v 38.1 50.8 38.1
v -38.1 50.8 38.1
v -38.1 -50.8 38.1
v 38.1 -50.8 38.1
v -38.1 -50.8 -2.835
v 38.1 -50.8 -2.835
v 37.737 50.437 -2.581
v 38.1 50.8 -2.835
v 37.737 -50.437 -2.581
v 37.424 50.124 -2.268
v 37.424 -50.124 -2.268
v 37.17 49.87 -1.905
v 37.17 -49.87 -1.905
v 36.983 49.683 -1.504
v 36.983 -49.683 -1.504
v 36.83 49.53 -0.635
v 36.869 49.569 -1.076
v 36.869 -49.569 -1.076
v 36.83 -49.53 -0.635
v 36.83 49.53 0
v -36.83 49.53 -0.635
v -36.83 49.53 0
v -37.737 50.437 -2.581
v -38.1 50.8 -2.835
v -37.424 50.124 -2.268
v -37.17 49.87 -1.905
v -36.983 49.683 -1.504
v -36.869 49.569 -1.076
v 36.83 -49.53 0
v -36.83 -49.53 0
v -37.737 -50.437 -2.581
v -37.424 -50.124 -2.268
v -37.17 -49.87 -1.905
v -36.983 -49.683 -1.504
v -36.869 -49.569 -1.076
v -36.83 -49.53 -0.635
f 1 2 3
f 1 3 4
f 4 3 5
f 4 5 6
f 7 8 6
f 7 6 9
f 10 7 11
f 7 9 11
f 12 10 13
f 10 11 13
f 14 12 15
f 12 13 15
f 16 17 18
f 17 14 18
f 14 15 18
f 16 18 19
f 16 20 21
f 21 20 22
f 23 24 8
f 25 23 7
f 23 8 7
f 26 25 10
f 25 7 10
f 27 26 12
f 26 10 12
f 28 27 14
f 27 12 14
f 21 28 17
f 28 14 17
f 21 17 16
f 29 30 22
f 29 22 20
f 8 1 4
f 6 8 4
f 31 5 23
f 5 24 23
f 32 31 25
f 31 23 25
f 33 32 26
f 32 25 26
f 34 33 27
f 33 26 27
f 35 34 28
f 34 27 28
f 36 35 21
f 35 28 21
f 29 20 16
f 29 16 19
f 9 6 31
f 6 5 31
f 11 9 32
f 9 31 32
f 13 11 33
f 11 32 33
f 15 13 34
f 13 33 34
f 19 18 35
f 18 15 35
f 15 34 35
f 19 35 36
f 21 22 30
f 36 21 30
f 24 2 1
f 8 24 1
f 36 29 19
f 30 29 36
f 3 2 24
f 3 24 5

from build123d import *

# Parameters (mm, degrees)
F0_W         = 76.2
F0_H         = 101.6
F1_DEPTH     = 38.1
F3_W         = 76.2
F3_H         = 101.6
F3_W_2       = 73.66
F3_H_2       = 99.06
F4_DEPTH     = 3.175
F5_T1_DEPTH  = 99.06
F5_T3_DEPTH  = 73.66
F5_T9_DEPTH  = 105.41
F5_T15_DEPTH = 80.01
F5_T24_DEPTH = 105.41
F5_T30_DEPTH = 80.01
F5_T39_DEPTH = 80.01
F5_T45_DEPTH = 105.41
F5_T54_DEPTH = 105.41
F5_T60_DEPTH = 80.01


# Not quite as in the source:
# - a fillet or chamfer that OpenCascade refuses, or shapes differently, is made with other operations: its cross-section is extruded or revolved along the edge and cut away or added


with BuildPart() as f1:
    # F0 (on Top) → F1 (new body)
    with BuildSketch(Plane.XY):
        Rectangle(F0_W, F0_H)
    extrude(amount=F1_DEPTH)

    # F3 (on face) → F4 (join)
    with BuildSketch(Plane(origin=(0, 0, 0), x_dir=(1, 0, 0), z_dir=(0, 0, -1))):
        Rectangle(F3_W, F3_H)
        Rectangle(F3_W_2, F3_H_2, mode=Mode.SUBTRACT)
    extrude(amount=F4_DEPTH)

    # F5: fillet of radius 2.54 on 4 edges, made by hand

    # F5_s2 → F5_t1 (cut)
    with BuildSketch(Plane.XZ.offset(-49.53)):
        with BuildLine():
            ThreePointArc((-39.37, -3.175), (-37.5739487758, -2.4310512242), (-36.83, -0.635))
            Line((-36.83, -0.635), (-36.83, -3.175))
            Line((-36.83, -3.175), (-39.37, -3.175))
        make_face()
        with BuildLine():
            ThreePointArc((39.37, -3.175), (37.5739487758, -2.4310512242), (36.83, -0.635))
            Line((36.83, -0.635), (36.83, -3.175))
            Line((36.83, -3.175), (39.37, -3.175))
        make_face()
    extrude(amount=F5_T1_DEPTH, mode=Mode.SUBTRACT)

    # F5_s4 → F5_t3 (cut)
    with BuildSketch(Plane.YZ.offset(-36.83)):
        with BuildLine():
            ThreePointArc((-52.07, -3.175), (-50.2739487758, -2.4310512242), (-49.53, -0.635))
            Line((-49.53, -0.635), (-49.53, -3.175))
            Line((-49.53, -3.175), (-52.07, -3.175))
        make_face()
        with BuildLine():
            ThreePointArc((52.07, -3.175), (50.2739487758, -2.4310512242), (49.53, -0.635))
            Line((49.53, -0.635), (49.53, -3.175))
            Line((49.53, -3.175), (52.07, -3.175))
        make_face()
    extrude(amount=F5_T3_DEPTH, mode=Mode.SUBTRACT)


with BuildPart() as f5_tool7:
    # F5_s8 → F5_t9 (new body)
    with BuildSketch(Plane.XZ.offset(-55.88)):
        with BuildLine():
            ThreePointArc((-39.37, -3.175), (-37.5739487758, -2.4310512242), (-36.83, -0.635))
            Line((-36.83, -0.635), (-36.83, -3.175))
            Line((-36.83, -3.175), (-39.37, -3.175))
        make_face()
    extrude(amount=F5_T9_DEPTH)

    split(bisect_by=Plane.XZ.offset(-49.53), keep=Keep.BOTTOM)

    split(bisect_by=Plane.YZ.offset(-38.1), keep=Keep.TOP)

    split(bisect_by=Plane.XZ.offset(-50.8), keep=Keep.TOP)


with BuildPart() as f5_tool13:
    # F5_s14 → F5_t15 (new body)
    with BuildSketch(Plane.YZ.offset(36.83)):
        with BuildLine():
            ThreePointArc((52.07, -3.175), (50.2739487758, -2.4310512242), (49.53, -0.635))
            Line((49.53, -0.635), (49.53, -3.175))
            Line((49.53, -3.175), (52.07, -3.175))
        make_face()
    extrude(amount=-F5_T15_DEPTH)

    split(bisect_by=Plane.YZ.offset(-36.83), keep=Keep.BOTTOM)

    split(bisect_by=Plane.YZ.offset(-38.1), keep=Keep.TOP)

    split(bisect_by=Plane.XZ.offset(-50.8), keep=Keep.TOP)


with BuildPart() as f5_tool7_1:
    add(f5_tool7.part)

    # F5_t19: intersect F5_tool13
    add(f5_tool13.part, mode=Mode.INTERSECT)


with BuildPart() as f1_1:
    add(f1.part)

    # F5_t5: cut F5_tool7
    add(f5_tool7_1.part, mode=Mode.SUBTRACT)


with BuildPart() as f5_tool22:
    # F5_s23 → F5_t24 (new body)
    with BuildSketch(Plane.XZ.offset(-49.53)):
        with BuildLine():
            ThreePointArc((-39.37, -3.175), (-37.5739487758, -2.4310512242), (-36.83, -0.635))
            Line((-36.83, -0.635), (-36.83, -3.175))
            Line((-36.83, -3.175), (-39.37, -3.175))
        make_face()
    extrude(amount=F5_T24_DEPTH)

    split(bisect_by=Plane.XZ.offset(49.53), keep=Keep.TOP)

    split(bisect_by=Plane.YZ.offset(-38.1), keep=Keep.TOP)

    split(bisect_by=Plane.XZ.offset(50.8), keep=Keep.BOTTOM)


with BuildPart() as f5_tool28:
    # F5_s29 → F5_t30 (new body)
    with BuildSketch(Plane.YZ.offset(-43.18)):
        with BuildLine():
            ThreePointArc((-52.07, -3.175), (-50.2739487758, -2.4310512242), (-49.53, -0.635))
            Line((-49.53, -0.635), (-49.53, -3.175))
            Line((-49.53, -3.175), (-52.07, -3.175))
        make_face()
    extrude(amount=F5_T30_DEPTH)

    split(bisect_by=Plane.YZ.offset(-36.83), keep=Keep.BOTTOM)

    split(bisect_by=Plane.YZ.offset(-38.1), keep=Keep.TOP)

    split(bisect_by=Plane.XZ.offset(50.8), keep=Keep.BOTTOM)


with BuildPart() as f5_tool22_1:
    add(f5_tool22.part)

    # F5_t34: intersect F5_tool28
    add(f5_tool28.part, mode=Mode.INTERSECT)


with BuildPart() as f1_2:
    add(f1_1.part)

    # F5_t20: cut F5_tool22
    add(f5_tool22_1.part, mode=Mode.SUBTRACT)


with BuildPart() as f5_tool37:
    # F5_s38 → F5_t39 (new body)
    with BuildSketch(Plane.YZ.offset(-36.83)):
        with BuildLine():
            ThreePointArc((-52.07, -3.175), (-50.2739487758, -2.4310512242), (-49.53, -0.635))
            Line((-49.53, -0.635), (-49.53, -3.175))
            Line((-49.53, -3.175), (-52.07, -3.175))
        make_face()
    extrude(amount=F5_T39_DEPTH)

    split(bisect_by=Plane.YZ.offset(38.1), keep=Keep.BOTTOM)

    split(bisect_by=Plane.YZ.offset(36.83), keep=Keep.TOP)

    split(bisect_by=Plane.XZ.offset(50.8), keep=Keep.BOTTOM)


with BuildPart() as f5_tool43:
    # F5_s44 → F5_t45 (new body)
    with BuildSketch(Plane.XZ.offset(55.88)):
        with BuildLine():
            ThreePointArc((39.37, -3.175), (37.5739487758, -2.4310512242), (36.83, -0.635))
            Line((36.83, -0.635), (36.83, -3.175))
            Line((36.83, -3.175), (39.37, -3.175))
        make_face()
    extrude(amount=-F5_T45_DEPTH)

    split(bisect_by=Plane.YZ.offset(38.1), keep=Keep.BOTTOM)

    split(bisect_by=Plane.XZ.offset(49.53), keep=Keep.TOP)

    split(bisect_by=Plane.XZ.offset(50.8), keep=Keep.BOTTOM)


with BuildPart() as f5_tool37_1:
    add(f5_tool37.part)

    # F5_t49: intersect F5_tool43
    add(f5_tool43.part, mode=Mode.INTERSECT)


with BuildPart() as f1_3:
    add(f1_2.part)

    # F5_t35: cut F5_tool37
    add(f5_tool37_1.part, mode=Mode.SUBTRACT)


with BuildPart() as f5_tool52:
    # F5_s53 → F5_t54 (new body)
    with BuildSketch(Plane.XZ.offset(49.53)):
        with BuildLine():
            ThreePointArc((39.37, -3.175), (37.5739487758, -2.4310512242), (36.83, -0.635))
            Line((36.83, -0.635), (36.83, -3.175))
            Line((36.83, -3.175), (39.37, -3.175))
        make_face()
    extrude(amount=-F5_T54_DEPTH)

    split(bisect_by=Plane.YZ.offset(38.1), keep=Keep.BOTTOM)

    split(bisect_by=Plane.XZ.offset(-49.53), keep=Keep.BOTTOM)

    split(bisect_by=Plane.XZ.offset(-50.8), keep=Keep.TOP)


with BuildPart() as f5_tool58:
    # F5_s59 → F5_t60 (new body)
    with BuildSketch(Plane.YZ.offset(43.18)):
        with BuildLine():
            ThreePointArc((52.07, -3.175), (50.2739487758, -2.4310512242), (49.53, -0.635))
            Line((49.53, -0.635), (49.53, -3.175))
            Line((49.53, -3.175), (52.07, -3.175))
        make_face()
    extrude(amount=-F5_T60_DEPTH)

    split(bisect_by=Plane.YZ.offset(38.1), keep=Keep.BOTTOM)

    split(bisect_by=Plane.YZ.offset(36.83), keep=Keep.TOP)

    split(bisect_by=Plane.XZ.offset(-50.8), keep=Keep.TOP)


with BuildPart() as f5_tool52_1:
    add(f5_tool52.part)

    # F5_t64: intersect F5_tool58
    add(f5_tool58.part, mode=Mode.INTERSECT)


with BuildPart() as f1_4:
    add(f1_3.part)

    # F5_t50: cut F5_tool52
    add(f5_tool52_1.part, mode=Mode.SUBTRACT)


solid = f1_4.part
